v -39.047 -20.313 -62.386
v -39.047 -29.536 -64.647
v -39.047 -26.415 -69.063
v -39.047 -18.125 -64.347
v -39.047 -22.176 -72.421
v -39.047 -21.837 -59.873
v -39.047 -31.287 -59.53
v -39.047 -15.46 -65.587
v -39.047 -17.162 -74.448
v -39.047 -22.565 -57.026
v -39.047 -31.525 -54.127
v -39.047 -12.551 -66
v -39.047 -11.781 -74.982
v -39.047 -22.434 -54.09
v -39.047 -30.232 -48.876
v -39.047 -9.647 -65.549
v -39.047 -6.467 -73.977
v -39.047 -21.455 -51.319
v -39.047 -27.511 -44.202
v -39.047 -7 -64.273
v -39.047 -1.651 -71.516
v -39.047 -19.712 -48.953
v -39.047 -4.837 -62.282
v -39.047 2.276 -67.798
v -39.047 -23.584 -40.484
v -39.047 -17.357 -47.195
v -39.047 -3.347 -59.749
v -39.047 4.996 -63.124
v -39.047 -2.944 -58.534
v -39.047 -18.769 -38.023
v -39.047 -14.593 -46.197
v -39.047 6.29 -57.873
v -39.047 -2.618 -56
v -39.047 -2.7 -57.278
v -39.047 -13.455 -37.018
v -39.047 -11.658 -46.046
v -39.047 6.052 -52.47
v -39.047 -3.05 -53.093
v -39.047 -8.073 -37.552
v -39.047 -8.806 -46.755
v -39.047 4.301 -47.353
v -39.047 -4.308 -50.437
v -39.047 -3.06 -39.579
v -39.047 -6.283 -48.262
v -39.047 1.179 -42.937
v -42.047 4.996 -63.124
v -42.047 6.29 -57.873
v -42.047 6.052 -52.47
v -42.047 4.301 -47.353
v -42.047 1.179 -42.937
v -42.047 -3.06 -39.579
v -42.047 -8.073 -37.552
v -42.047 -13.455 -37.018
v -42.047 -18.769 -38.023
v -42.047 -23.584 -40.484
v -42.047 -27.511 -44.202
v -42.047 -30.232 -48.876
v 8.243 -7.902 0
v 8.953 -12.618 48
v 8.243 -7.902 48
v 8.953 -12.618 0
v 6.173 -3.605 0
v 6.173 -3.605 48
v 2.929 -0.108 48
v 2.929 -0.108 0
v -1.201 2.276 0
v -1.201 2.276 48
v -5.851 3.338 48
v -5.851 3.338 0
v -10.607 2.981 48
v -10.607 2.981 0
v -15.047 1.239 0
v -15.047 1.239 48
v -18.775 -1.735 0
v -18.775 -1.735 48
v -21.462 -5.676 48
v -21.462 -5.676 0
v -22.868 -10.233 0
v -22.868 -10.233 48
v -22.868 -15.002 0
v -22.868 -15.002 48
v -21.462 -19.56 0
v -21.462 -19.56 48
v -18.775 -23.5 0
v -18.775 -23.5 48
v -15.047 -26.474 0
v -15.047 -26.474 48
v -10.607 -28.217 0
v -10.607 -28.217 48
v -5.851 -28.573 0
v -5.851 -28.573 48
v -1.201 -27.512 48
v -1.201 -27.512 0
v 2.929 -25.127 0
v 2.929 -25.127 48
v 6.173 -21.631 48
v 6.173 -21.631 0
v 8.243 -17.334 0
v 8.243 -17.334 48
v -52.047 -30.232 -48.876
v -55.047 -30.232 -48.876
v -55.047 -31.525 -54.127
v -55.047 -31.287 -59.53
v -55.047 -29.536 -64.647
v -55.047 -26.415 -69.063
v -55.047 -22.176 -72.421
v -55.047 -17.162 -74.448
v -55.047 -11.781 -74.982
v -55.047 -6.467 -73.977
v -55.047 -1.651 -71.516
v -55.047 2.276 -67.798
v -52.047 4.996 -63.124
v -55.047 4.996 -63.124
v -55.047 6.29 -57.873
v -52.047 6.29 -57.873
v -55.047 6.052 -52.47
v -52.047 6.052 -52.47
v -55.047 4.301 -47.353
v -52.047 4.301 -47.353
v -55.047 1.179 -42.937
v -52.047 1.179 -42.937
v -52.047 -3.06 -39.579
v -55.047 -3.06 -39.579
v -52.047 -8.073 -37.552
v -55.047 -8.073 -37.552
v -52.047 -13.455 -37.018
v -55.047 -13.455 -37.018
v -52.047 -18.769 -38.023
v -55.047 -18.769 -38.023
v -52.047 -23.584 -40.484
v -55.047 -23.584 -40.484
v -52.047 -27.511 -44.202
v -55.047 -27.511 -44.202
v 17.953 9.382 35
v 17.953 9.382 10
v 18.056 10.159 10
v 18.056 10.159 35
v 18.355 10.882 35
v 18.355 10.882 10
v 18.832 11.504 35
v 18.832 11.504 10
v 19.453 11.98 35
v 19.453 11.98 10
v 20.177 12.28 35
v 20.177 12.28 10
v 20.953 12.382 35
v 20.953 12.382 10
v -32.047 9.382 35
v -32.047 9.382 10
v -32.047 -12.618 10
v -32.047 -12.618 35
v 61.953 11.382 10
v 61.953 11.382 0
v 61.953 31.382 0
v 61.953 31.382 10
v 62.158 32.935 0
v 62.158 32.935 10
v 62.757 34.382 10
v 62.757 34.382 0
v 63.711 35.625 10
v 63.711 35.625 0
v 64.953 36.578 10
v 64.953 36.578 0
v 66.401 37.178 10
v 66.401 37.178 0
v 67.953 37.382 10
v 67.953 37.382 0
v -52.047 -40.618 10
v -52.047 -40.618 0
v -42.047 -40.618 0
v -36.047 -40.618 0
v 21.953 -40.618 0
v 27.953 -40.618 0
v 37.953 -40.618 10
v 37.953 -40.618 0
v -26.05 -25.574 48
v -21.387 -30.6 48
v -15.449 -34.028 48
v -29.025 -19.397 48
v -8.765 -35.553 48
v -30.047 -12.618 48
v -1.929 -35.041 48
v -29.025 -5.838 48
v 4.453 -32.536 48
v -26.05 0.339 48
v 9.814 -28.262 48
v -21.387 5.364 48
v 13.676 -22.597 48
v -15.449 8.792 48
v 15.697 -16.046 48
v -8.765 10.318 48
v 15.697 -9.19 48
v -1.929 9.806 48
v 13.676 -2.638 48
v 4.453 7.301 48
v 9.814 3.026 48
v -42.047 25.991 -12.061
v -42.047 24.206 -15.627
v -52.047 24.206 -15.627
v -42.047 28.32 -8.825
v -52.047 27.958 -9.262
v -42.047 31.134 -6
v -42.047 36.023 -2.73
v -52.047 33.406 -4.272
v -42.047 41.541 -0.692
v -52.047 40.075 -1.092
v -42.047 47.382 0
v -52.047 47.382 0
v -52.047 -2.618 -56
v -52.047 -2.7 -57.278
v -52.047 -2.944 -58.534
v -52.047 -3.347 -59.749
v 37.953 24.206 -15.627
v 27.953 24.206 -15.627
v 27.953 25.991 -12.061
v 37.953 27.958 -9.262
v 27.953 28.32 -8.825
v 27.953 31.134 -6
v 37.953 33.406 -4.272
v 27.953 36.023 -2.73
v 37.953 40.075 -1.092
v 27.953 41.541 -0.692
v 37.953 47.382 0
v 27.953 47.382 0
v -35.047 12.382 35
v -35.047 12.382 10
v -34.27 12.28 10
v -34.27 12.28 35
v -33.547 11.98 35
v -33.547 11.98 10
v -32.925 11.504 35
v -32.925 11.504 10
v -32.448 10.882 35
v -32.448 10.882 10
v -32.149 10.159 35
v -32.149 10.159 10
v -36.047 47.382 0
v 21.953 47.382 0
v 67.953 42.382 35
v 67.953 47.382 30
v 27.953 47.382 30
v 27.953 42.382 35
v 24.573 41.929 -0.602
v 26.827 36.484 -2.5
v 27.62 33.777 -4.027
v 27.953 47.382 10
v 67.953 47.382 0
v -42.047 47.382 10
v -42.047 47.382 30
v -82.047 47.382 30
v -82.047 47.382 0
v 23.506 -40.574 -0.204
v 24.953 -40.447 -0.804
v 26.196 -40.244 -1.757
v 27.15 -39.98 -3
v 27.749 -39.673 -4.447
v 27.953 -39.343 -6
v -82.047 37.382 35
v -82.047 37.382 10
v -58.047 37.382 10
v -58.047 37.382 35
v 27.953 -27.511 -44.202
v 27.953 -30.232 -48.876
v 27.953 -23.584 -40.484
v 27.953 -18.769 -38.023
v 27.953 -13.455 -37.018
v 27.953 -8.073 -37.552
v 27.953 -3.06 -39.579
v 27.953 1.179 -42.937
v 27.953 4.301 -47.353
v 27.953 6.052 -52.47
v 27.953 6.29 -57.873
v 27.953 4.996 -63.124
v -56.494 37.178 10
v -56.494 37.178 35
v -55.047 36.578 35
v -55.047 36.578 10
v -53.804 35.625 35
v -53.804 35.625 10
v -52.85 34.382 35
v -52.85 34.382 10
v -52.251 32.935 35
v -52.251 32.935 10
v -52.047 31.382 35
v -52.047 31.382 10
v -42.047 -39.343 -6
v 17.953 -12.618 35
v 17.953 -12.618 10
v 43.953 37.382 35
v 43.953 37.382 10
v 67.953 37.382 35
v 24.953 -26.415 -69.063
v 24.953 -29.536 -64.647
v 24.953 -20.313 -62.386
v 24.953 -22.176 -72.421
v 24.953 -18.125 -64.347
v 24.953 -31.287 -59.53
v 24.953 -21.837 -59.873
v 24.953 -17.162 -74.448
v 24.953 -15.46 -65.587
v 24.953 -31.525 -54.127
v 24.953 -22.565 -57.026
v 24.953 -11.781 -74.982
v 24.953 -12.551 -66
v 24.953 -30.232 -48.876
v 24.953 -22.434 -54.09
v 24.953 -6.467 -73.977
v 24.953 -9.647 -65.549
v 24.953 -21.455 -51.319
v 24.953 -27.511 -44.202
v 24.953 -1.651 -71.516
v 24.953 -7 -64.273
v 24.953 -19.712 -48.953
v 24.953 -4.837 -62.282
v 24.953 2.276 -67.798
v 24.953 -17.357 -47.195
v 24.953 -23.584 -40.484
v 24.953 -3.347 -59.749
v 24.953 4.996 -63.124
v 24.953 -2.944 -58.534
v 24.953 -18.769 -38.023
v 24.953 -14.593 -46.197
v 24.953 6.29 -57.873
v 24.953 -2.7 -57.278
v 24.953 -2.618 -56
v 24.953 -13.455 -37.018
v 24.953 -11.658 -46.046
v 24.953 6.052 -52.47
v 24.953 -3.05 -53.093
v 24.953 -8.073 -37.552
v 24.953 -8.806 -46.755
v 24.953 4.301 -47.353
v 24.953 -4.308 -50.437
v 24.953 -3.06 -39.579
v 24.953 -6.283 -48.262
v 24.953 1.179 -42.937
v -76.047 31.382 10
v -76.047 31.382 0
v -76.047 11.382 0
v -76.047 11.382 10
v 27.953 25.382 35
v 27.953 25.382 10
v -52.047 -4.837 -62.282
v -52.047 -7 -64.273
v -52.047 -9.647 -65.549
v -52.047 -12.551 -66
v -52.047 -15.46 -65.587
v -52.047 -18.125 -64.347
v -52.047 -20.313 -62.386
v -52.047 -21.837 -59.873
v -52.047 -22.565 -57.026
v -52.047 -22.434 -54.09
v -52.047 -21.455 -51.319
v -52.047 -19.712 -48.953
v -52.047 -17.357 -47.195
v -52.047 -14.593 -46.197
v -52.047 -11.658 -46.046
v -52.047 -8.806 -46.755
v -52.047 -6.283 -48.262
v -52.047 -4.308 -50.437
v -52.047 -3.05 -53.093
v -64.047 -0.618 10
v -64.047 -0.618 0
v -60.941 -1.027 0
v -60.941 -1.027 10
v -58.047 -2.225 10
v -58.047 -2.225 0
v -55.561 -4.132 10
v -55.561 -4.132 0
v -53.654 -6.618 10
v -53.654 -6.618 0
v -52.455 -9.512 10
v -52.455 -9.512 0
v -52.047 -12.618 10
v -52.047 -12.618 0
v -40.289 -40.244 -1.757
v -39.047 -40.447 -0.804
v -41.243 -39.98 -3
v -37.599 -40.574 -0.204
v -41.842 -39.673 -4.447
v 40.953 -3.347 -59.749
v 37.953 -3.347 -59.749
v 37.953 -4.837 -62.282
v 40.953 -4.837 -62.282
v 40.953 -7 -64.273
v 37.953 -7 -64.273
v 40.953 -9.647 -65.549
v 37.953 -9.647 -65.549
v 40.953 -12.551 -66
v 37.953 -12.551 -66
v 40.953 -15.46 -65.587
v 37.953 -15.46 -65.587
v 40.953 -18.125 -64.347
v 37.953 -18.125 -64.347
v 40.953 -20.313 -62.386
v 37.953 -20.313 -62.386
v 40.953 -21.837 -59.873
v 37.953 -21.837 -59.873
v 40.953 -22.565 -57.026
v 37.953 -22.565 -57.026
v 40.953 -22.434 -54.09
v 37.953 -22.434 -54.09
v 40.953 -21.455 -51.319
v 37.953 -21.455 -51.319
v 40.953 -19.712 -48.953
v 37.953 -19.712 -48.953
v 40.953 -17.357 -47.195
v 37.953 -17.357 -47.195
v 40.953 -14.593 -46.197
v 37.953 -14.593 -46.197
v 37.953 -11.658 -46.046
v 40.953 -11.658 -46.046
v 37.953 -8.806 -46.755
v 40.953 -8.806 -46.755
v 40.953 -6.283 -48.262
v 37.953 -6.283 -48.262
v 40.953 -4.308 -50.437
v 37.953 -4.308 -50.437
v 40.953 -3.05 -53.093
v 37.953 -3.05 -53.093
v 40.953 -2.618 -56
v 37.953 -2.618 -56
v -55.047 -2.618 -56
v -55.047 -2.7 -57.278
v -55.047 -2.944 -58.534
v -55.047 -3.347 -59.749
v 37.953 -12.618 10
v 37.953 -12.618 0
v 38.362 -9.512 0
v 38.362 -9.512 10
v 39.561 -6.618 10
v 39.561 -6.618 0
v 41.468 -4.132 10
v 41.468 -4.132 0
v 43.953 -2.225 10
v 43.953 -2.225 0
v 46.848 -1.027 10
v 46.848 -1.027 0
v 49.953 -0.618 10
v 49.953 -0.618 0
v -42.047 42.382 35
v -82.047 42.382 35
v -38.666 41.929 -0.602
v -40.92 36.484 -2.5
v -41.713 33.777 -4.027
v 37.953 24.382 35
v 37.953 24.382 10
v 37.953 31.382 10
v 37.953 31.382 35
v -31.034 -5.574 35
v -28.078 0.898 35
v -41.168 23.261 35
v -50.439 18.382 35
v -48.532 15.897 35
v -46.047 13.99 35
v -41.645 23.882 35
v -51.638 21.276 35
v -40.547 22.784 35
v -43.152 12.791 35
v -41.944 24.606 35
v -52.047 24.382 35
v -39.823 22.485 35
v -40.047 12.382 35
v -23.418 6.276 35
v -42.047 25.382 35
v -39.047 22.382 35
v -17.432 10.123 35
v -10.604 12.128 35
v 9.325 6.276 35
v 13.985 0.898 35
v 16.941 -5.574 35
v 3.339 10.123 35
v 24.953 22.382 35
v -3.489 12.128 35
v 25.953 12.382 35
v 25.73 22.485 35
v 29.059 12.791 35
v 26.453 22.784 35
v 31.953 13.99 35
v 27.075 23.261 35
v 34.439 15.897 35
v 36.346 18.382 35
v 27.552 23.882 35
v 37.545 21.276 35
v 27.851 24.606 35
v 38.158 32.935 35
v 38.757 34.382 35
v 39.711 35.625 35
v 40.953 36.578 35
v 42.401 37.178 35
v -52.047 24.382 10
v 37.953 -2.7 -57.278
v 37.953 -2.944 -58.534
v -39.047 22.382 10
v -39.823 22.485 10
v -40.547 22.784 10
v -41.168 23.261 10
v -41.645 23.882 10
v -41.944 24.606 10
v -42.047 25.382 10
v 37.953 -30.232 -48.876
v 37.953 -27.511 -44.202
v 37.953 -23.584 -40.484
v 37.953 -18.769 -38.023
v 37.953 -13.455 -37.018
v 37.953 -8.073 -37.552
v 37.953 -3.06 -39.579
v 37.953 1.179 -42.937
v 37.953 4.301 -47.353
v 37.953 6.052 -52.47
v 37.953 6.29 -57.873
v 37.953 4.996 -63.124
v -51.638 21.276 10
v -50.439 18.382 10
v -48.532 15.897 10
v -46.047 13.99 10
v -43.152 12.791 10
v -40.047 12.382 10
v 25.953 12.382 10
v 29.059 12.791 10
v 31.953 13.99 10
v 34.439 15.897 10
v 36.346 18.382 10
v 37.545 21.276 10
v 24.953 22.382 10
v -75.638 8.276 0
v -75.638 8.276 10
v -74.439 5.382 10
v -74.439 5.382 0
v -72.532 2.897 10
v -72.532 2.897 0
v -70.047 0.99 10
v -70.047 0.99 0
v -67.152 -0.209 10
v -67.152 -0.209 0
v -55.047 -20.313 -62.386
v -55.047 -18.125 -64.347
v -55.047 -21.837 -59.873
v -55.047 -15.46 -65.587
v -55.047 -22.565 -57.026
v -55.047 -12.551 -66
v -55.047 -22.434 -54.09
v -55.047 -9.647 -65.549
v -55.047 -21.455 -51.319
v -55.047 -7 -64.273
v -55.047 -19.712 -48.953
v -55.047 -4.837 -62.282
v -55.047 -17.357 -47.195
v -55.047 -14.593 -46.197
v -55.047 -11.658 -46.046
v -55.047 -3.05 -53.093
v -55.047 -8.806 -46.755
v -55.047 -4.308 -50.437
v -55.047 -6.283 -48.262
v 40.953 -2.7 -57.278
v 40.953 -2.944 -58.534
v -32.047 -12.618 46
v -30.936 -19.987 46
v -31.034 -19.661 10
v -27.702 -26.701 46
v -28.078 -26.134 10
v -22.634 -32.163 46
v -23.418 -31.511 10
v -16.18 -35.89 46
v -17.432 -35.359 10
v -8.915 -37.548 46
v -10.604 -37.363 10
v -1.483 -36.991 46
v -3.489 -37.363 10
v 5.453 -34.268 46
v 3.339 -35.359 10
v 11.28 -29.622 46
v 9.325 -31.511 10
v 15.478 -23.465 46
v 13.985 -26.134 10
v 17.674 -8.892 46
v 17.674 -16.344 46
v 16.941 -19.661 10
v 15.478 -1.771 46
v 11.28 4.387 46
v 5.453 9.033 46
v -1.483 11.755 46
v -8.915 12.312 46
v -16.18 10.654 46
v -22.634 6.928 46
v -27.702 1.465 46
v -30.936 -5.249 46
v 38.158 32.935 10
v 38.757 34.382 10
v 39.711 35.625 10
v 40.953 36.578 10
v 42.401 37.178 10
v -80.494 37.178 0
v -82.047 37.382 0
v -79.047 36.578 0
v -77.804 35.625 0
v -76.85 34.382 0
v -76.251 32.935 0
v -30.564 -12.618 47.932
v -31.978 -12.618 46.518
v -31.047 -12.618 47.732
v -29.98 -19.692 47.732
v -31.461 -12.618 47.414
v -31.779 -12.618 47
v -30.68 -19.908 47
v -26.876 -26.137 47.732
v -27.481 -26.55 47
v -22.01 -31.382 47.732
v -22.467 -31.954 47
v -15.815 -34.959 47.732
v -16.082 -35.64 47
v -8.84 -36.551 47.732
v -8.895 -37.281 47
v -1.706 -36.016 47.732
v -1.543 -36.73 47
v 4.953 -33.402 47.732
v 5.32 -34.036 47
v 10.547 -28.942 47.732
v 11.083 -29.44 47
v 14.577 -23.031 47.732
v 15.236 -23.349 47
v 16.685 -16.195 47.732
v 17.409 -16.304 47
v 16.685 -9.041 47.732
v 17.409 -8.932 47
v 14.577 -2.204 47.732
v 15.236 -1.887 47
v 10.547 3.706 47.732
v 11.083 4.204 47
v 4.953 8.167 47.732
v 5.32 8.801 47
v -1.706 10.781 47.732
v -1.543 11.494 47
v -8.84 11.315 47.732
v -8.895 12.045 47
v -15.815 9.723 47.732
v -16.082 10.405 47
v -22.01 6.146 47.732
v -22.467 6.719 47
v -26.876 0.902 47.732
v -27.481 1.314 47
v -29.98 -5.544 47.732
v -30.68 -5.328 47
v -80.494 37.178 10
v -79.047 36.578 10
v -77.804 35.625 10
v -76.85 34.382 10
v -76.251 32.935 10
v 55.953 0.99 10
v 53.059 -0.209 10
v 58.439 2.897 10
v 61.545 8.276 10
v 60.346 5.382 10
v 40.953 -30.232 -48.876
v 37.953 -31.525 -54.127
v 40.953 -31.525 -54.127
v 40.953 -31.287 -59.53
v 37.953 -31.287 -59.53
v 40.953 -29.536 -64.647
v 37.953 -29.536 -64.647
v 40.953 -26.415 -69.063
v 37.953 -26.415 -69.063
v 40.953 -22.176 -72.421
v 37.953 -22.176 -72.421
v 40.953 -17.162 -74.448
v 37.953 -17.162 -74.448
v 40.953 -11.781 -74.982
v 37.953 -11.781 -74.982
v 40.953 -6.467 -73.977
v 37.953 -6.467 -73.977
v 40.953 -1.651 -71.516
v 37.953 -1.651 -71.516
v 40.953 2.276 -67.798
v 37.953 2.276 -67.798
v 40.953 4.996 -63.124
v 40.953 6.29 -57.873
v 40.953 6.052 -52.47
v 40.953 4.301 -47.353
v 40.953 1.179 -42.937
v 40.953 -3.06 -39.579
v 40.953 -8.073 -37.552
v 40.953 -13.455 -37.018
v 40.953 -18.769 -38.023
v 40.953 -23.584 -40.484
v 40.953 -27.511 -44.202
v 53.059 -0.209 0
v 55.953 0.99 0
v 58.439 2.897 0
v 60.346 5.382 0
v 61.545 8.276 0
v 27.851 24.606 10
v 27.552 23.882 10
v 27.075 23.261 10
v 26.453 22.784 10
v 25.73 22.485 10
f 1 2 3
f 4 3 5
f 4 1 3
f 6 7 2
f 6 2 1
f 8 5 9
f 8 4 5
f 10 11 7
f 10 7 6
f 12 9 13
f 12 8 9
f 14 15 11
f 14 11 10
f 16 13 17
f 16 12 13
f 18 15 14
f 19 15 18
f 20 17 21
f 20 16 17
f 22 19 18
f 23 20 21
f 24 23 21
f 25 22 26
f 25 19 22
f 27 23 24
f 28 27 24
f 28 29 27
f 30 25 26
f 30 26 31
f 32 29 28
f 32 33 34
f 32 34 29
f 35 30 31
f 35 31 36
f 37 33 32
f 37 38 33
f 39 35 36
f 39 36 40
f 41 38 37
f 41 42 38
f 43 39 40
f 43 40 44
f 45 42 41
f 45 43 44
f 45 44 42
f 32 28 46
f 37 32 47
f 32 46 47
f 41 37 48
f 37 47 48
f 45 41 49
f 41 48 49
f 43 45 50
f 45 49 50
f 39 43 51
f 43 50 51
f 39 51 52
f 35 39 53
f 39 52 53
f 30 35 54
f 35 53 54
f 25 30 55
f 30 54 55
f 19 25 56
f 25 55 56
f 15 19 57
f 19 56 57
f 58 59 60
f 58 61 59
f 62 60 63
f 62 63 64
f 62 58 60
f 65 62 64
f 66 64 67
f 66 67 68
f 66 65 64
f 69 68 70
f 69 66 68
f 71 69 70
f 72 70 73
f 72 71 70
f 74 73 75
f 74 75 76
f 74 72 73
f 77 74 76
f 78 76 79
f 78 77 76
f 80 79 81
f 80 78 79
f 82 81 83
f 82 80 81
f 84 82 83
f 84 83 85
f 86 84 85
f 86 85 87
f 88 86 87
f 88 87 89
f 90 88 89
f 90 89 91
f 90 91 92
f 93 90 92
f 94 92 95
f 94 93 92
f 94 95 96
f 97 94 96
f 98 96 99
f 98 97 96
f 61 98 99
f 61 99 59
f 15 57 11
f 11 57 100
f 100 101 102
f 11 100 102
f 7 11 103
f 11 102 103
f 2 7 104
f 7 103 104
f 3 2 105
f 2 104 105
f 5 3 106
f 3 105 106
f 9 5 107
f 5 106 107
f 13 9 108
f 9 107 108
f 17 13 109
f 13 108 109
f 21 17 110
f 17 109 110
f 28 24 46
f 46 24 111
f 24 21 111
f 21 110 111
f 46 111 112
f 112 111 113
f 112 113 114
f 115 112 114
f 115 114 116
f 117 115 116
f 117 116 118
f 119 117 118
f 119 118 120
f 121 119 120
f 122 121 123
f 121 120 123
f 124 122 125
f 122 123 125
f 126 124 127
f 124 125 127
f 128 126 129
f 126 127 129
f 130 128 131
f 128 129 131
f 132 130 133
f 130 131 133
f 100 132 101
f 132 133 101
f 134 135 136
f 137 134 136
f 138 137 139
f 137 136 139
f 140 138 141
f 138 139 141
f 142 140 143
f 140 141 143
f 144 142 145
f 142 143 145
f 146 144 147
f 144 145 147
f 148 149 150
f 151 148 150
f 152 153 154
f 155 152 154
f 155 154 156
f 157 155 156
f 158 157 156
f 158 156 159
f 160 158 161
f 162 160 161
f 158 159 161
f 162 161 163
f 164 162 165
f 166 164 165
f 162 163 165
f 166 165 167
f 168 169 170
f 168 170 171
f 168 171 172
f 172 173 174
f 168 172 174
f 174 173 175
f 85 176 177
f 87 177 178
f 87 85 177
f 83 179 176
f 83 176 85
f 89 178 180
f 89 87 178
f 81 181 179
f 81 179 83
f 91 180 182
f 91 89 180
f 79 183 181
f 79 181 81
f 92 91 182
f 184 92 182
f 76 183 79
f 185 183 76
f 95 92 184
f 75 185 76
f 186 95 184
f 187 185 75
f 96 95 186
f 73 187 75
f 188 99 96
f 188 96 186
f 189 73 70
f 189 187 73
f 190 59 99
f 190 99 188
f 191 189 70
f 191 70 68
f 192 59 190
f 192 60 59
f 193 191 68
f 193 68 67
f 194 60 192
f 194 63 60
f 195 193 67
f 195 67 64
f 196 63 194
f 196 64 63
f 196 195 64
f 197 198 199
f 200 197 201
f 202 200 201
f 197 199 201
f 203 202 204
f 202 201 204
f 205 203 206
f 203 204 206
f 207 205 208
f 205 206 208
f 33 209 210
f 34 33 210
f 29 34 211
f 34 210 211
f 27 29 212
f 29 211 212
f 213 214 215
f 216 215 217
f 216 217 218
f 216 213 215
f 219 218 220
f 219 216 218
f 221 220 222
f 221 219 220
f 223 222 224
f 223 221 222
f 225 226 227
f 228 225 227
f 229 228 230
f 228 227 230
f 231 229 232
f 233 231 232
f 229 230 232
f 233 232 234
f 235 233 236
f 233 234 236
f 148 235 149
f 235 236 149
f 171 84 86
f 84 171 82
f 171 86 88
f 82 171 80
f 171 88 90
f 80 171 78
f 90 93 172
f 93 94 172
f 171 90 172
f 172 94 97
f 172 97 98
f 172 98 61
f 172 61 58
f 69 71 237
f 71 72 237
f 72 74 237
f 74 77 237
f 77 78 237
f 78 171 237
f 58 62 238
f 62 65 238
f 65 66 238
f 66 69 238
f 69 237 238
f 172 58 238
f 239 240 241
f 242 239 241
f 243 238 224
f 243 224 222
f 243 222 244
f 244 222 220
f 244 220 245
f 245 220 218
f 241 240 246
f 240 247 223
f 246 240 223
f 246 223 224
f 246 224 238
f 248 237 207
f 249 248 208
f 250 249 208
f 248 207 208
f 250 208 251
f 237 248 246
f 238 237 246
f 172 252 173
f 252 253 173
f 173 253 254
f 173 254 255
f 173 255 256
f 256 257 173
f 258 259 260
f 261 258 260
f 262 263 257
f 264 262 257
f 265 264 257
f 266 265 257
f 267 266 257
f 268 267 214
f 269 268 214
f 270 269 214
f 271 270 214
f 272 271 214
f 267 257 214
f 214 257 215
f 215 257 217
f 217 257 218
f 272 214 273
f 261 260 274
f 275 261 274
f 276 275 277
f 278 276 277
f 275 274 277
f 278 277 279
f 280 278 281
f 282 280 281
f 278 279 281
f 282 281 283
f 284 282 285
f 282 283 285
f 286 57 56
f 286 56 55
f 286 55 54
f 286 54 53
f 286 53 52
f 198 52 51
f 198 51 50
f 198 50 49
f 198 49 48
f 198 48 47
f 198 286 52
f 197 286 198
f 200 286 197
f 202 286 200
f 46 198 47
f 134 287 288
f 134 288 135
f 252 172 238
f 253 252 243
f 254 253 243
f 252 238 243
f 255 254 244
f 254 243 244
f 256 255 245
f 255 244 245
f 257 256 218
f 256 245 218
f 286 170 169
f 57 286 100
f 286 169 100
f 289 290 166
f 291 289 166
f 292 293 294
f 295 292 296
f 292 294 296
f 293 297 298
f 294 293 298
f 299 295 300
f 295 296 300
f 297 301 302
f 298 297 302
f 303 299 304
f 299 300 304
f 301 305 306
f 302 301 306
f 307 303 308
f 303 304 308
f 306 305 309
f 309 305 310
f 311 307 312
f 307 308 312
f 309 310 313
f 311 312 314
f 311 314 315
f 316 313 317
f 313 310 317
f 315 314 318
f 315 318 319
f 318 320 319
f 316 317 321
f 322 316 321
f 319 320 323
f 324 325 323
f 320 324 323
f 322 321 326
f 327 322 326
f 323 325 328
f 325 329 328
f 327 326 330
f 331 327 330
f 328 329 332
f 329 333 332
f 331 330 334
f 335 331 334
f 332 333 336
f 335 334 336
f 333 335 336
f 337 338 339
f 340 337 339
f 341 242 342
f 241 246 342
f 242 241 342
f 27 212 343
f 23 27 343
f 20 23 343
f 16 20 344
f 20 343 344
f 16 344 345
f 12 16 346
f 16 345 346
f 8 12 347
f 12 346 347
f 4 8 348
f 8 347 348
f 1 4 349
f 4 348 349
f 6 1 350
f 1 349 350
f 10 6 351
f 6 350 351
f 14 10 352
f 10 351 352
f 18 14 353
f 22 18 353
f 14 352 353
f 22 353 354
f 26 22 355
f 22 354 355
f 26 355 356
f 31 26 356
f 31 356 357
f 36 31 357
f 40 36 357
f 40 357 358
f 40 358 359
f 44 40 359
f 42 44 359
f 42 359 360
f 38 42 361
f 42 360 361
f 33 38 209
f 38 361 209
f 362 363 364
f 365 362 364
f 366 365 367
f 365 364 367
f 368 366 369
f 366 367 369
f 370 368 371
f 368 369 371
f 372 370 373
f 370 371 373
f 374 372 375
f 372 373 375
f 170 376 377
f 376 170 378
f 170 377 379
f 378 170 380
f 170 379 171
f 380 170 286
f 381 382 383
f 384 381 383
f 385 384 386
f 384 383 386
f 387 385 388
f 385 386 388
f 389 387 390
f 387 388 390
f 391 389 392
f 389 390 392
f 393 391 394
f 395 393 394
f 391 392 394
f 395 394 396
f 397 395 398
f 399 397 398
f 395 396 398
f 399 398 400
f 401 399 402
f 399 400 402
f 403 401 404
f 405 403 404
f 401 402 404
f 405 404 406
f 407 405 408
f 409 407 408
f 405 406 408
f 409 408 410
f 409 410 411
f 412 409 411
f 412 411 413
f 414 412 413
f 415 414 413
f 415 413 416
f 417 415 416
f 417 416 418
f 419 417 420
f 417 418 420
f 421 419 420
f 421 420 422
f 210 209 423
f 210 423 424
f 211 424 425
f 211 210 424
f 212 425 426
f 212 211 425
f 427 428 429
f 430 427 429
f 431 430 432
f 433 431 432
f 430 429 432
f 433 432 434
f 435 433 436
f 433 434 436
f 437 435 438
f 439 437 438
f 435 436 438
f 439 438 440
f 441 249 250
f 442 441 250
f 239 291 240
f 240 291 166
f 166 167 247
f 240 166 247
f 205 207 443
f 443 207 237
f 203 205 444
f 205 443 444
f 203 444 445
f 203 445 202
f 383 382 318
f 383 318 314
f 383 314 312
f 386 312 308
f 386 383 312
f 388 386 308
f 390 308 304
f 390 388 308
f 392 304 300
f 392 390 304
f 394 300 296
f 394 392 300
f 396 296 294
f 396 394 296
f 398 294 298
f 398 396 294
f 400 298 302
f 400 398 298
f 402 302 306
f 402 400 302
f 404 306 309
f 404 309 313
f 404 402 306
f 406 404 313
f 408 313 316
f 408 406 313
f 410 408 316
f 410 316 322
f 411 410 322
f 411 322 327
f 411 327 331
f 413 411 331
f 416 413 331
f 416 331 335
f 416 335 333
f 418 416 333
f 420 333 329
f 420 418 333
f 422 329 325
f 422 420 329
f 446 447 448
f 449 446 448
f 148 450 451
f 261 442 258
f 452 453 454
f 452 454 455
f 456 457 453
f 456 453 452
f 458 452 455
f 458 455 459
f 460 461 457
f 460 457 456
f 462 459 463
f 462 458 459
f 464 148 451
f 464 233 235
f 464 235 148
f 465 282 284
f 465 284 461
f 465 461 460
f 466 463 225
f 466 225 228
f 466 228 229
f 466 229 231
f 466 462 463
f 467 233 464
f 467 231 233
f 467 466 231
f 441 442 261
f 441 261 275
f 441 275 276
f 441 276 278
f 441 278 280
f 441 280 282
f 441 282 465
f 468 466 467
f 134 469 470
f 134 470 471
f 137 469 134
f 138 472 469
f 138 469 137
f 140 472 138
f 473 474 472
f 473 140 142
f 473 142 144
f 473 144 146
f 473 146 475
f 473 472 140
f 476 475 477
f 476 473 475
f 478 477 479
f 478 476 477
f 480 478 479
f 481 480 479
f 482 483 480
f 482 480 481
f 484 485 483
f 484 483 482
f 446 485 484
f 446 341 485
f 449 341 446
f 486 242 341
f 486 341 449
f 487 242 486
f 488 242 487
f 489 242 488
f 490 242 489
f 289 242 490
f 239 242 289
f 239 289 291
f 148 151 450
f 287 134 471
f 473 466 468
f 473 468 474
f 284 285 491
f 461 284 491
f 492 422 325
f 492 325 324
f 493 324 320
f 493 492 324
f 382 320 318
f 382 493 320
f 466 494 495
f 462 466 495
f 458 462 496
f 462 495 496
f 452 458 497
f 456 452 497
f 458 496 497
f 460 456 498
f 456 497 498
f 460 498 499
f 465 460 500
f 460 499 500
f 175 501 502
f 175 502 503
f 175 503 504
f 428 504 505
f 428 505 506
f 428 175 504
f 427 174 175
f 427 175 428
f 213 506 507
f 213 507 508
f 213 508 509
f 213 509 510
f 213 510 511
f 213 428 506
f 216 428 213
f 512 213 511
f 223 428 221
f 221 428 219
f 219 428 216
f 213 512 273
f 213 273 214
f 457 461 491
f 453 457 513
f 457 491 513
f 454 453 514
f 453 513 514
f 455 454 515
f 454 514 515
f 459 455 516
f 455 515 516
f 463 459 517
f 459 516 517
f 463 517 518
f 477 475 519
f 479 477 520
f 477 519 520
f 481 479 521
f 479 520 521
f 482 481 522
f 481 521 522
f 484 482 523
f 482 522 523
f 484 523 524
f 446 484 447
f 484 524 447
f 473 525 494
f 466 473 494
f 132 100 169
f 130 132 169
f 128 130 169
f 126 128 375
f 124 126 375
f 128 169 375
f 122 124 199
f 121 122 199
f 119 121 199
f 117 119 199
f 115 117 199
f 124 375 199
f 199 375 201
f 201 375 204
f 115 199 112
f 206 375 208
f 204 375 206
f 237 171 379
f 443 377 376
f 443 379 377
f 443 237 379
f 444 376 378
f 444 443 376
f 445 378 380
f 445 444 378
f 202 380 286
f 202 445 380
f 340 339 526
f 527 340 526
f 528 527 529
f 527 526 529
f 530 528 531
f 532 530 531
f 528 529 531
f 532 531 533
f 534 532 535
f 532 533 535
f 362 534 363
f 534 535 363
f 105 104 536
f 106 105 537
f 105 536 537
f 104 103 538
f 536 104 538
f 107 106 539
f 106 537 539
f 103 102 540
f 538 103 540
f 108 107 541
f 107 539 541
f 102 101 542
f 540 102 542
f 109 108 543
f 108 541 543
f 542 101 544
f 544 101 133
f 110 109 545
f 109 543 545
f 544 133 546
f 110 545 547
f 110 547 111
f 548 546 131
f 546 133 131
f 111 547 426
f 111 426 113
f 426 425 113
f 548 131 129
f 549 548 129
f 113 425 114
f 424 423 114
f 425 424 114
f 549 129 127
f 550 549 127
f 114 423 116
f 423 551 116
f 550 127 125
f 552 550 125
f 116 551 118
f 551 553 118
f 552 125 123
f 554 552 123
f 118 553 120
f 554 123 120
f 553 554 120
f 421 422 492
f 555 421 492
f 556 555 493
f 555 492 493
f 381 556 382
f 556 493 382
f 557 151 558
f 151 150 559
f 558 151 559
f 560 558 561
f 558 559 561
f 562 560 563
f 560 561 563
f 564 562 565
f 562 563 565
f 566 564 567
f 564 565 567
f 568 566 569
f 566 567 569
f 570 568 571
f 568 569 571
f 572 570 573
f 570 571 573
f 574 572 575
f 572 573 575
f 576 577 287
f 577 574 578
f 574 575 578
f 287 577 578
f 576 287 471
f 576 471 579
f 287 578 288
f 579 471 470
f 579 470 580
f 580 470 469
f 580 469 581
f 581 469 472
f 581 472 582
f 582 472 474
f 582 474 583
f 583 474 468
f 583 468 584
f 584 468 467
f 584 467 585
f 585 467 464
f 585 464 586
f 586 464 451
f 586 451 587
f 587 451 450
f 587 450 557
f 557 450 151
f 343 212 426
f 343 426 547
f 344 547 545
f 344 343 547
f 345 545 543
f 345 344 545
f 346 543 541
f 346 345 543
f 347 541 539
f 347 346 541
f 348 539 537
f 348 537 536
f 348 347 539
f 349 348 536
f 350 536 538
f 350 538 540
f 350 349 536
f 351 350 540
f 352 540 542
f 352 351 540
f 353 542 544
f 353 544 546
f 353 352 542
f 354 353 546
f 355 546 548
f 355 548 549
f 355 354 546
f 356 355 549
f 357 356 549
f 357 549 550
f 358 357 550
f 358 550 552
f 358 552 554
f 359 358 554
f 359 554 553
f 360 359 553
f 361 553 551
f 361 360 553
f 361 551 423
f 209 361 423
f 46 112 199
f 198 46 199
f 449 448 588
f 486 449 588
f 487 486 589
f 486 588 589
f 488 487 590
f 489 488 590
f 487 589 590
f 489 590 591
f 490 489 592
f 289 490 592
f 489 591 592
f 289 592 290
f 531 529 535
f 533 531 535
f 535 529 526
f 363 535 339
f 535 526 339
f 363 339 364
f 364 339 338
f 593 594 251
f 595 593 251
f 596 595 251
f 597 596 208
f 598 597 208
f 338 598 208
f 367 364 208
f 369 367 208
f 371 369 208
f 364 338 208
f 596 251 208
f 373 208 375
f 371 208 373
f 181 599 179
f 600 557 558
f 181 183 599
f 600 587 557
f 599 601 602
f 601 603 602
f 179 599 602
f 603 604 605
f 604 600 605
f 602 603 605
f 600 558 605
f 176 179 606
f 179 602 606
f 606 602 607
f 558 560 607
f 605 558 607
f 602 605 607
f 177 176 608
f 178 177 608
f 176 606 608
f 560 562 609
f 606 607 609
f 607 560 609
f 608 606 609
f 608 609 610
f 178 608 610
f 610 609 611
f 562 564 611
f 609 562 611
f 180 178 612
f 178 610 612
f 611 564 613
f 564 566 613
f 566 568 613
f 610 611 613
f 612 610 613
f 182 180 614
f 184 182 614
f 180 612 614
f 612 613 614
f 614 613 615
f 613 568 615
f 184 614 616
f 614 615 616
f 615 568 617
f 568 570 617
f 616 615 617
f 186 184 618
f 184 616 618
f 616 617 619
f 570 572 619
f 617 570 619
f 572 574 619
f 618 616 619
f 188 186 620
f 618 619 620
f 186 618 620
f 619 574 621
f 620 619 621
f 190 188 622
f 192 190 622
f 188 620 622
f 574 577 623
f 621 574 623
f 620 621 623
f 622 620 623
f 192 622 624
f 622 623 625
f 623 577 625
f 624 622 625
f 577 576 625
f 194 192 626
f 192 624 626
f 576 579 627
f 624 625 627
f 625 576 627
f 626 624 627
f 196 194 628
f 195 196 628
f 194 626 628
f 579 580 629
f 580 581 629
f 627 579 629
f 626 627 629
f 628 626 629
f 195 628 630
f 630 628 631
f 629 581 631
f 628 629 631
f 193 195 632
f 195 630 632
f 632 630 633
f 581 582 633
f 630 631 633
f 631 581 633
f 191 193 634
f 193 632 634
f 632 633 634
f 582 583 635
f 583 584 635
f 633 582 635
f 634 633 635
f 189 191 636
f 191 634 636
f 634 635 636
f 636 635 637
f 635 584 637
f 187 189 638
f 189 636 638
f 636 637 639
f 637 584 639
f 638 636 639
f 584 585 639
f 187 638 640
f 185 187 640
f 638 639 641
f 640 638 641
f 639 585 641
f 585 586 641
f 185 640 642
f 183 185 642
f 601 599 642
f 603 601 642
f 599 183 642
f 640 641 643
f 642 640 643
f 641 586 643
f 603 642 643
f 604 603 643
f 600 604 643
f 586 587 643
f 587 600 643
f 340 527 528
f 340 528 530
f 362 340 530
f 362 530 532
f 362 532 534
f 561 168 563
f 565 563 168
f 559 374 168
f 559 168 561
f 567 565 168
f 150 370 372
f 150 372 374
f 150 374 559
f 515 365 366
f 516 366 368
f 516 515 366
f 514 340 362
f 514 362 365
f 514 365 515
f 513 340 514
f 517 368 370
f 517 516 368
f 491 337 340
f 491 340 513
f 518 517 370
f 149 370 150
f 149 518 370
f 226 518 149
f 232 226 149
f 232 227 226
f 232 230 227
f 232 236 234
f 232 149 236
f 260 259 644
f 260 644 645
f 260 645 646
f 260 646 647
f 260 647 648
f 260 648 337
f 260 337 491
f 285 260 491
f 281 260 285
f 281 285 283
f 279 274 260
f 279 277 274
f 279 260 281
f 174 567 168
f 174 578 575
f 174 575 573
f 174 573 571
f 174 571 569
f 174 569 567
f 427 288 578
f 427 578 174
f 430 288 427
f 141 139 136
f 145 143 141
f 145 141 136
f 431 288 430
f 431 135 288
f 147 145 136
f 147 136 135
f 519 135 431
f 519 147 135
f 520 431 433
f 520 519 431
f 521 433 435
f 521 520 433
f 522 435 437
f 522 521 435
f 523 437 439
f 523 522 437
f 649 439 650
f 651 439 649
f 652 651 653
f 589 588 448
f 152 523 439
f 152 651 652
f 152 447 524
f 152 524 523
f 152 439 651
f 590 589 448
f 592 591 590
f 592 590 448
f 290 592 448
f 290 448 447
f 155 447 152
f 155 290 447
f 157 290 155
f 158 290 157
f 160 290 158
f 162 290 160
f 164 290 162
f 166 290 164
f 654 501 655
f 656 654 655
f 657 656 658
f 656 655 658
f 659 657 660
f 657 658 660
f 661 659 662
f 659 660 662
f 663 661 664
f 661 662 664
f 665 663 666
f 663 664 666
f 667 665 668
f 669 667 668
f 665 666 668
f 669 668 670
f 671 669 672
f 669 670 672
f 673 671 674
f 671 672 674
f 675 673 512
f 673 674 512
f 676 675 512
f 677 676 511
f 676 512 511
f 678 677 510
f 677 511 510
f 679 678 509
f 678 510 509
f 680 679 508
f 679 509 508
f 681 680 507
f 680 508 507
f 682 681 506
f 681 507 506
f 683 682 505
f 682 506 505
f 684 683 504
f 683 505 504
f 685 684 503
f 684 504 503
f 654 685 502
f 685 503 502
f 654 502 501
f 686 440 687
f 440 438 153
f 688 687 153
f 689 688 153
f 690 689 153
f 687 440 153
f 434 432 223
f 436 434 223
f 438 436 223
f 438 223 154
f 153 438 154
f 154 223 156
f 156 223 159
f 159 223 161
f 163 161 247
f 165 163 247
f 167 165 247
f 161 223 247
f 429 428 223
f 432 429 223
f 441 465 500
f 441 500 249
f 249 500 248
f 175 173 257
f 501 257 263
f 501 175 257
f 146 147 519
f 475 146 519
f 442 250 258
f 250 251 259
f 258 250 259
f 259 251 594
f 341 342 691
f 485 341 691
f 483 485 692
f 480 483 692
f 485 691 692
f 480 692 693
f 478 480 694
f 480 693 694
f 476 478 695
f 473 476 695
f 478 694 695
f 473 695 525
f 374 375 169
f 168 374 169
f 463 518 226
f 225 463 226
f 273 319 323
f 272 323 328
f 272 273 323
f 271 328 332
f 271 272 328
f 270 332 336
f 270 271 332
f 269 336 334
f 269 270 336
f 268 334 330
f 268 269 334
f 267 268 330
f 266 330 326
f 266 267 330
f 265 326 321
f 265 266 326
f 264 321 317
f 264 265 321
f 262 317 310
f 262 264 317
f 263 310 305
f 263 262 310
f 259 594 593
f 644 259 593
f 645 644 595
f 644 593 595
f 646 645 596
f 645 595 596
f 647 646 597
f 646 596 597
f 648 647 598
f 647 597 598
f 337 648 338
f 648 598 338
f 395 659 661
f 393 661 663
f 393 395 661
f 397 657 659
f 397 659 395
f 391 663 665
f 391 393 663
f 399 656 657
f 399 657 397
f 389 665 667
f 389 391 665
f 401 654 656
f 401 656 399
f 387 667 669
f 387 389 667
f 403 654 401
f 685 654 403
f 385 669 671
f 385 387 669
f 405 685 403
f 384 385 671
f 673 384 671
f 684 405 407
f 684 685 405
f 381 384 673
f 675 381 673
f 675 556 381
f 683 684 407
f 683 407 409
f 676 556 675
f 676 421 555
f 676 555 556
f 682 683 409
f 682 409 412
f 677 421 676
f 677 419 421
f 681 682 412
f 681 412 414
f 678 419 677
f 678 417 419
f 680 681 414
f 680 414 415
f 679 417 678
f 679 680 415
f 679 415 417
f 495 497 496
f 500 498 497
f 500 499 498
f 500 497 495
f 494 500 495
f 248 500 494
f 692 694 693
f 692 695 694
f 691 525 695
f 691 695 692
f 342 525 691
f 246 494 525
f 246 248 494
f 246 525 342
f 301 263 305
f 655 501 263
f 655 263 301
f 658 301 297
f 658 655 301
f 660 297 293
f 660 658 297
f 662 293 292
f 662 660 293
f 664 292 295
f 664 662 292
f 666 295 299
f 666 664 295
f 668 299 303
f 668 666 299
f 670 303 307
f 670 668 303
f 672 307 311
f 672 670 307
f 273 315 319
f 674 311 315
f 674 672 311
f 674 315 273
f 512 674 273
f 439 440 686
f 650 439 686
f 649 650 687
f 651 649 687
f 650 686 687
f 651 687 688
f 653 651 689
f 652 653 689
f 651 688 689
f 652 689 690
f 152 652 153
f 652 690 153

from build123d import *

# Parameters (mm, degrees)
F0_R          = 16
F1_DEPTH      = 10
F2_DEPTH      = 35
F3_DEPTH      = 48
F5_DEPTH      = 10
F6_DEPTH      = 3
F6_DEPTH_BACK = 13
F7_T4_DEPTH   = 103
F7_S5_R       = 25
F7_T6_DEPTH   = 53
F7_T11_DEPTH  = 103
F7_S12_R      = 25
F7_T13_DEPTH  = 53
F13_R         = 2
F14_SIZE      = 5


# Not quite as in the source:
# - a fillet or chamfer that OpenCascade refuses, or shapes differently, is made with other operations: its cross-section is extruded or revolved along the edge and cut away or added
# - a feature of the source that left no trace in its solid (it failed there, or was rolled back) is left out
# - a pattern or mirror of a feature is missing from the dataset's text; its kind, count and spacing are read off the source's solid


with BuildPart() as f1:
    # F0 (on Top) → F1 (new body)
    with BuildSketch(Plane.XY):
        with BuildLine():
            Line((-42.0465118704, 47.3822976644), (-82.0465118704, 47.3822976644))
            Line((-82.0465118704, 47.3822976644), (-82.0465118704, 37.3822976644))
            Line((-82.0465118704, 37.3822976644), (-58.0465118704, 37.3822976644))
            ThreePointArc((-58.0465118704, 37.3822976644), (-53.8038711833, 35.6249383515), (-52.0465118704, 31.3822976644))
            Line((-52.0465118704, 31.3822976644), (-52.0465118704, 24.3822976644))
            ThreePointArc((-52.0465118704, 24.3822976644), (-48.5317932447, 15.8970162901), (-40.0465118704, 12.3822976644))
            Line((-40.0465118704, 12.3822976644), (-35.0465118704, 12.3822976644))
            ThreePointArc((-35.0465118704, 12.3822976644), (-32.9251915269, 11.5036180079), (-32.0465118704, 9.3822976644))
            Line((-32.0465118704, 9.3822976644), (-32.0465118704, -12.6177023356))
            ThreePointArc((-32.0465118704, -12.6177023356), (-7.0465118704, 12.3822976644), (17.9534881296, -12.6177023356))
            Line((17.9534881296, -12.6177023356), (17.9534881296, 9.3822976644))
            ThreePointArc((17.9534881296, 9.3822976644), (18.832167786, 11.5036180079), (20.9534881296, 12.3822976644))
            Line((20.9534881296, 12.3822976644), (25.9534881296, 12.3822976644))
            ThreePointArc((25.9534881296, 12.3822976644), (34.4387695038, 15.8970162901), (37.9534881296, 24.3822976644))
            Line((37.9534881296, 24.3822976644), (37.9534881296, 31.3822976644))
            ThreePointArc((37.9534881296, 31.3822976644), (39.7108474424, 35.6249383515), (43.9534881296, 37.3822976644))
            Line((43.9534881296, 37.3822976644), (67.9534881296, 37.3822976644))
            Line((67.9534881296, 37.3822976644), (67.9534881296, 47.3822976644))
            Line((67.9534881296, 47.3822976644), (27.9534881296, 47.3822976644))
            Line((27.9534881296, 47.3822976644), (27.9534881296, 25.3822976644))
            ThreePointArc((27.9534881296, 25.3822976644), (27.0748084731, 23.2609773208), (24.9534881296, 22.3822976644))
            Line((24.9534881296, 22.3822976644), (-39.0465118704, 22.3822976644))
            ThreePointArc((-39.0465118704, 22.3822976644), (-41.167832214, 23.2609773208), (-42.0465118704, 25.3822976644))
            Line((-42.0465118704, 25.3822976644), (-42.0465118704, 47.3822976644))
        make_face()
        with BuildLine():
            Line((27.9534881296, 47.3822976644), (-42.0465118704, 47.3822976644))
            Line((-42.0465118704, 47.3822976644), (-42.0465118704, 25.3822976644))
            ThreePointArc((-42.0465118704, 25.3822976644), (-41.167832214, 23.2609773208), (-39.0465118704, 22.3822976644))
            Line((-39.0465118704, 22.3822976644), (24.9534881296, 22.3822976644))
            ThreePointArc((24.9534881296, 22.3822976644), (27.0748084731, 23.2609773208), (27.9534881296, 25.3822976644))
            Line((27.9534881296, 25.3822976644), (27.9534881296, 47.3822976644))
        make_face()
        with BuildLine():
            Line((-58.0465118704, 37.3822976644), (-82.0465118704, 37.3822976644))
            ThreePointArc((-82.0465118704, 37.3822976644), (-77.8038711833, 35.6249383515), (-76.0465118704, 31.3822976644))
            Line((-76.0465118704, 31.3822976644), (-76.0465118704, 11.3822976644))
            ThreePointArc((-76.0465118704, 11.3822976644), (-72.5317932447, 2.8970162901), (-64.0465118704, -0.6177023356))
            ThreePointArc((-64.0465118704, -0.6177023356), (-55.5612304962, -4.1324209614), (-52.0465118704, -12.6177023356))
            Line((-52.0465118704, -12.6177023356), (-52.0465118704, -40.6177023356))
            Line((-52.0465118704, -40.6177023356), (37.9534881296, -40.6177023356))
            Line((37.9534881296, -40.6177023356), (37.9534881296, -12.6177023356))
            ThreePointArc((37.9534881296, -12.6177023356), (41.4682067553, -4.1324209614), (49.9534881296, -0.6177023356))
            ThreePointArc((49.9534881296, -0.6177023356), (58.4387695038, 2.8970162901), (61.9534881296, 11.3822976644))
            Line((61.9534881296, 11.3822976644), (61.9534881296, 31.3822976644))
            ThreePointArc((61.9534881296, 31.3822976644), (63.7108474424, 35.6249383515), (67.9534881296, 37.3822976644))
            Line((67.9534881296, 37.3822976644), (43.9534881296, 37.3822976644))
            ThreePointArc((43.9534881296, 37.3822976644), (39.7108474424, 35.6249383515), (37.9534881296, 31.3822976644))
            Line((37.9534881296, 31.3822976644), (37.9534881296, 24.3822976644))
            ThreePointArc((37.9534881296, 24.3822976644), (34.4387695038, 15.8970162901), (25.9534881296, 12.3822976644))
            Line((25.9534881296, 12.3822976644), (20.9534881296, 12.3822976644))
            ThreePointArc((20.9534881296, 12.3822976644), (18.832167786, 11.5036180079), (17.9534881296, 9.3822976644))
            Line((17.9534881296, 9.3822976644), (17.9534881296, -12.6177023356))
            ThreePointArc((17.9534881296, -12.6177023356), (-7.0465118704, -37.6177023356), (-32.0465118704, -12.6177023356))
            Line((-32.0465118704, -12.6177023356), (-32.0465118704, 9.3822976644))
            ThreePointArc((-32.0465118704, 9.3822976644), (-32.9251915269, 11.5036180079), (-35.0465118704, 12.3822976644))
            Line((-35.0465118704, 12.3822976644), (-40.0465118704, 12.3822976644))
            ThreePointArc((-40.0465118704, 12.3822976644), (-48.5317932447, 15.8970162901), (-52.0465118704, 24.3822976644))
            Line((-52.0465118704, 24.3822976644), (-52.0465118704, 31.3822976644))
            ThreePointArc((-52.0465118704, 31.3822976644), (-53.8038711833, 35.6249383515), (-58.0465118704, 37.3822976644))
        make_face()
        with BuildLine():
            ThreePointArc((17.9534881296, -12.6177023356), (-7.0465118704, 12.3822976644), (-32.0465118704, -12.6177023356))
            ThreePointArc((-32.0465118704, -12.6177023356), (-7.0465118704, -37.6177023356), (17.9534881296, -12.6177023356))
        make_face()
        with Locations((-7.0465118704, -12.6177023356)):
            Circle(F0_R, mode=Mode.SUBTRACT)
    extrude(amount=F1_DEPTH)

    # F0 (on Top) → F2 (join)
    with BuildSketch(Plane.XY):
        with BuildLine():
            Line((-42.0465118704, 47.3822976644), (-82.0465118704, 47.3822976644))
            Line((-82.0465118704, 47.3822976644), (-82.0465118704, 37.3822976644))
            Line((-82.0465118704, 37.3822976644), (-58.0465118704, 37.3822976644))
            ThreePointArc((-58.0465118704, 37.3822976644), (-53.8038711833, 35.6249383515), (-52.0465118704, 31.3822976644))
            Line((-52.0465118704, 31.3822976644), (-52.0465118704, 24.3822976644))
            ThreePointArc((-52.0465118704, 24.3822976644), (-48.5317932447, 15.8970162901), (-40.0465118704, 12.3822976644))
            Line((-40.0465118704, 12.3822976644), (-35.0465118704, 12.3822976644))
            ThreePointArc((-35.0465118704, 12.3822976644), (-32.9251915269, 11.5036180079), (-32.0465118704, 9.3822976644))
            Line((-32.0465118704, 9.3822976644), (-32.0465118704, -12.6177023356))
            ThreePointArc((-32.0465118704, -12.6177023356), (-7.0465118704, 12.3822976644), (17.9534881296, -12.6177023356))
            Line((17.9534881296, -12.6177023356), (17.9534881296, 9.3822976644))
            ThreePointArc((17.9534881296, 9.3822976644), (18.832167786, 11.5036180079), (20.9534881296, 12.3822976644))
            Line((20.9534881296, 12.3822976644), (25.9534881296, 12.3822976644))
            ThreePointArc((25.9534881296, 12.3822976644), (34.4387695038, 15.8970162901), (37.9534881296, 24.3822976644))
            Line((37.9534881296, 24.3822976644), (37.9534881296, 31.3822976644))
            ThreePointArc((37.9534881296, 31.3822976644), (39.7108474424, 35.6249383515), (43.9534881296, 37.3822976644))
            Line((43.9534881296, 37.3822976644), (67.9534881296, 37.3822976644))
            Line((67.9534881296, 37.3822976644), (67.9534881296, 47.3822976644))
            Line((67.9534881296, 47.3822976644), (27.9534881296, 47.3822976644))
            Line((27.9534881296, 47.3822976644), (27.9534881296, 25.3822976644))
            ThreePointArc((27.9534881296, 25.3822976644), (27.0748084731, 23.2609773208), (24.9534881296, 22.3822976644))
            Line((24.9534881296, 22.3822976644), (-39.0465118704, 22.3822976644))
            ThreePointArc((-39.0465118704, 22.3822976644), (-41.167832214, 23.2609773208), (-42.0465118704, 25.3822976644))
            Line((-42.0465118704, 25.3822976644), (-42.0465118704, 47.3822976644))
        make_face()
        with BuildLine():
            ThreePointArc((17.9534881296, -12.6177023356), (-7.0465118704, 12.3822976644), (-32.0465118704, -12.6177023356))
            ThreePointArc((-32.0465118704, -12.6177023356), (-7.0465118704, -37.6177023356), (17.9534881296, -12.6177023356))
        make_face()
        with Locations((-7.0465118704, -12.6177023356)):
            Circle(F0_R, mode=Mode.SUBTRACT)
    extrude(amount=F2_DEPTH)

    # F0 (on Top) → F3 (join)
    with BuildSketch(Plane.XY):
        with BuildLine():
            ThreePointArc((17.9534881296, -12.6177023356), (-7.0465118704, 12.3822976644), (-32.0465118704, -12.6177023356))
            ThreePointArc((-32.0465118704, -12.6177023356), (-7.0465118704, -37.6177023356), (17.9534881296, -12.6177023356))
        make_face()
        with Locations((-7.0465118704, -12.6177023356)):
            Circle(F0_R, mode=Mode.SUBTRACT)
    extrude(amount=F3_DEPTH)

    # F4 (on face) → F5 (join)
    with BuildSketch(Plane.YZ.offset(37.9534881296)):
        with BuildLine():
            Line((-40.6177023356, 0), (-30.2316619949, -48.8762071112))
            ThreePointArc((-30.2316619949, -48.8762071112), (-8.9890134213, -37.3497287751), (6.3822976644, -56))
            ThreePointArc((6.3822976644, -56), (6.0325688893, -59.6286889144), (4.9962573236, -63.1237928888))
            Line((4.9962573236, -63.1237928888), (24.2060349548, -15.6265883042))
            ThreePointArc((24.2060349548, -15.6265883042), (33.4061625118, -4.2715739575), (47.3822976644, 0))
            Line((47.3822976644, 0), (36.7724023624, 0))
            Line((36.7724023624, 0), (-12.6177023356, 0))
            Line((-12.6177023356, 0), (-40.6177023356, 0))
        make_face()
    f5 = extrude(amount=-F5_DEPTH)

    # F5_copies: F5 across plane
    add(f5.mirror(Plane(origin=(-7.046512, 0, 0), x_dir=(0, 0, -1), z_dir=(-1, 0, 0))))

    # F4 (on face) → F6 (join, two sides)
    with BuildSketch(Plane.YZ.offset(37.9534881296)) as f6_sk:
        with BuildLine():
            ThreePointArc((-3.3471972518, -59.7493646783), (-16.367067014, -65.2705050838), (-21.8882074194, -52.2506353217))
            Line((-21.8882074194, -52.2506353217), (-30.2316619949, -48.8762071112))
            ThreePointArc((-30.2316619949, -48.8762071112), (-19.7414952245, -73.6139596592), (4.9962573236, -63.1237928888))
            Line((4.9962573236, -63.1237928888), (-3.3471972518, -59.7493646783))
        make_face()
        with BuildLine():
            ThreePointArc((-21.8882074194, -52.2506353217), (-10.7078660649, -46.1840677764), (-2.6177023356, -56))
            ThreePointArc((-2.6177023356, -56), (-2.801770112, -57.9098362707), (-3.3471972518, -59.7493646783))
            Line((-3.3471972518, -59.7493646783), (4.9962573236, -63.1237928888))
            ThreePointArc((4.9962573236, -63.1237928888), (6.0325688893, -59.6286889144), (6.3822976644, -56))
            ThreePointArc((6.3822976644, -56), (-8.9890134213, -37.3497287751), (-30.2316619949, -48.8762071112))
            Line((-30.2316619949, -48.8762071112), (-21.8882074194, -52.2506353217))
        make_face()
    f6 = extrude(amount=F6_DEPTH) + extrude(f6_sk.sketch, amount=-F6_DEPTH_BACK)

    # F6_copies: F6 across plane
    add(f6.mirror(Plane(origin=(-7.046512, 0, 0), x_dir=(0, 0, -1), z_dir=(-1, 0, 0))))

    # F7: fillet of radius 6 on 2 edges, made by hand


with BuildPart() as f7_tool2:
    # F7_s3 → F7_t4 (new body)
    with BuildSketch(Plane.XZ.offset(-47.3822976644)):
        with BuildLine():
            ThreePointArc((21.9534881296, 0), (26.1961288167, -1.7573593129), (27.9534881296, -6))
            Line((27.9534881296, -6), (27.9534881296, 0))
            Line((27.9534881296, 0), (21.9534881296, 0))
        make_face()
    extrude(amount=F7_T4_DEPTH)

    # F7_s5 → F7_t6 (cut, symmetric)
    with BuildSketch(Plane.YZ.offset(25)):
        with Locations((47.3822976644, -25)):
            Circle(F7_S5_R)
    extrude(amount=F7_T6_DEPTH, both=True, mode=Mode.SUBTRACT)

    split(bisect_by=Plane(origin=(0, -38.8628535351, -8.2582341886), x_dir=(1, 0, 0), z_dir=(0, 0.9781594762, 0.2078558133)), keep=Keep.TOP)


with BuildPart() as f1_1:
    add(f1.part)

    # F7_t1: union F7_tool2
    add(f7_tool2.part)


with BuildPart() as f7_tool9:
    # F7_s10 → F7_t11 (new body)
    with BuildSketch(Plane.XZ.offset(-47.3822976644)):
        with BuildLine():
            ThreePointArc((-36.0465121296, 0), (-40.2891528167, -1.7573593129), (-42.0465121296, -6))
            Line((-42.0465121296, -6), (-42.0465121296, 0))
            Line((-42.0465121296, 0), (-36.0465121296, 0))
        make_face()
    extrude(amount=F7_T11_DEPTH)

    # F7_s12 → F7_t13 (cut, symmetric)
    with BuildSketch(Plane.YZ.offset(-39)):
        with Locations((47.3822976644, -25)):
            Circle(F7_S12_R)
    extrude(amount=F7_T13_DEPTH, both=True, mode=Mode.SUBTRACT)

    split(bisect_by=Plane(origin=(0, -38.8628535351, -8.2582341886), x_dir=(1, 0, 0), z_dir=(0, 0.9781594762, 0.2078558133)), keep=Keep.TOP)


with BuildPart() as f1_2:
    add(f1_1.part)

    # F7_t8: union F7_tool9
    add(f7_tool9.part)

    # F13
    f13_edges = [f1_2.edges().sort_by_distance(p)[0] for p in [
        (-32.046512, -12.617702, 48),
    ]]
    fillet(f13_edges, radius=F13_R)

    # F14
    f14_edges = [f1_2.edges().sort_by_distance(p)[0] for p in [
        (47.953488, 47.382298, 35),
        (-62.046512, 47.382298, 35),
    ]]
    chamfer(f14_edges, length=F14_SIZE)


solid = f1_2.part
